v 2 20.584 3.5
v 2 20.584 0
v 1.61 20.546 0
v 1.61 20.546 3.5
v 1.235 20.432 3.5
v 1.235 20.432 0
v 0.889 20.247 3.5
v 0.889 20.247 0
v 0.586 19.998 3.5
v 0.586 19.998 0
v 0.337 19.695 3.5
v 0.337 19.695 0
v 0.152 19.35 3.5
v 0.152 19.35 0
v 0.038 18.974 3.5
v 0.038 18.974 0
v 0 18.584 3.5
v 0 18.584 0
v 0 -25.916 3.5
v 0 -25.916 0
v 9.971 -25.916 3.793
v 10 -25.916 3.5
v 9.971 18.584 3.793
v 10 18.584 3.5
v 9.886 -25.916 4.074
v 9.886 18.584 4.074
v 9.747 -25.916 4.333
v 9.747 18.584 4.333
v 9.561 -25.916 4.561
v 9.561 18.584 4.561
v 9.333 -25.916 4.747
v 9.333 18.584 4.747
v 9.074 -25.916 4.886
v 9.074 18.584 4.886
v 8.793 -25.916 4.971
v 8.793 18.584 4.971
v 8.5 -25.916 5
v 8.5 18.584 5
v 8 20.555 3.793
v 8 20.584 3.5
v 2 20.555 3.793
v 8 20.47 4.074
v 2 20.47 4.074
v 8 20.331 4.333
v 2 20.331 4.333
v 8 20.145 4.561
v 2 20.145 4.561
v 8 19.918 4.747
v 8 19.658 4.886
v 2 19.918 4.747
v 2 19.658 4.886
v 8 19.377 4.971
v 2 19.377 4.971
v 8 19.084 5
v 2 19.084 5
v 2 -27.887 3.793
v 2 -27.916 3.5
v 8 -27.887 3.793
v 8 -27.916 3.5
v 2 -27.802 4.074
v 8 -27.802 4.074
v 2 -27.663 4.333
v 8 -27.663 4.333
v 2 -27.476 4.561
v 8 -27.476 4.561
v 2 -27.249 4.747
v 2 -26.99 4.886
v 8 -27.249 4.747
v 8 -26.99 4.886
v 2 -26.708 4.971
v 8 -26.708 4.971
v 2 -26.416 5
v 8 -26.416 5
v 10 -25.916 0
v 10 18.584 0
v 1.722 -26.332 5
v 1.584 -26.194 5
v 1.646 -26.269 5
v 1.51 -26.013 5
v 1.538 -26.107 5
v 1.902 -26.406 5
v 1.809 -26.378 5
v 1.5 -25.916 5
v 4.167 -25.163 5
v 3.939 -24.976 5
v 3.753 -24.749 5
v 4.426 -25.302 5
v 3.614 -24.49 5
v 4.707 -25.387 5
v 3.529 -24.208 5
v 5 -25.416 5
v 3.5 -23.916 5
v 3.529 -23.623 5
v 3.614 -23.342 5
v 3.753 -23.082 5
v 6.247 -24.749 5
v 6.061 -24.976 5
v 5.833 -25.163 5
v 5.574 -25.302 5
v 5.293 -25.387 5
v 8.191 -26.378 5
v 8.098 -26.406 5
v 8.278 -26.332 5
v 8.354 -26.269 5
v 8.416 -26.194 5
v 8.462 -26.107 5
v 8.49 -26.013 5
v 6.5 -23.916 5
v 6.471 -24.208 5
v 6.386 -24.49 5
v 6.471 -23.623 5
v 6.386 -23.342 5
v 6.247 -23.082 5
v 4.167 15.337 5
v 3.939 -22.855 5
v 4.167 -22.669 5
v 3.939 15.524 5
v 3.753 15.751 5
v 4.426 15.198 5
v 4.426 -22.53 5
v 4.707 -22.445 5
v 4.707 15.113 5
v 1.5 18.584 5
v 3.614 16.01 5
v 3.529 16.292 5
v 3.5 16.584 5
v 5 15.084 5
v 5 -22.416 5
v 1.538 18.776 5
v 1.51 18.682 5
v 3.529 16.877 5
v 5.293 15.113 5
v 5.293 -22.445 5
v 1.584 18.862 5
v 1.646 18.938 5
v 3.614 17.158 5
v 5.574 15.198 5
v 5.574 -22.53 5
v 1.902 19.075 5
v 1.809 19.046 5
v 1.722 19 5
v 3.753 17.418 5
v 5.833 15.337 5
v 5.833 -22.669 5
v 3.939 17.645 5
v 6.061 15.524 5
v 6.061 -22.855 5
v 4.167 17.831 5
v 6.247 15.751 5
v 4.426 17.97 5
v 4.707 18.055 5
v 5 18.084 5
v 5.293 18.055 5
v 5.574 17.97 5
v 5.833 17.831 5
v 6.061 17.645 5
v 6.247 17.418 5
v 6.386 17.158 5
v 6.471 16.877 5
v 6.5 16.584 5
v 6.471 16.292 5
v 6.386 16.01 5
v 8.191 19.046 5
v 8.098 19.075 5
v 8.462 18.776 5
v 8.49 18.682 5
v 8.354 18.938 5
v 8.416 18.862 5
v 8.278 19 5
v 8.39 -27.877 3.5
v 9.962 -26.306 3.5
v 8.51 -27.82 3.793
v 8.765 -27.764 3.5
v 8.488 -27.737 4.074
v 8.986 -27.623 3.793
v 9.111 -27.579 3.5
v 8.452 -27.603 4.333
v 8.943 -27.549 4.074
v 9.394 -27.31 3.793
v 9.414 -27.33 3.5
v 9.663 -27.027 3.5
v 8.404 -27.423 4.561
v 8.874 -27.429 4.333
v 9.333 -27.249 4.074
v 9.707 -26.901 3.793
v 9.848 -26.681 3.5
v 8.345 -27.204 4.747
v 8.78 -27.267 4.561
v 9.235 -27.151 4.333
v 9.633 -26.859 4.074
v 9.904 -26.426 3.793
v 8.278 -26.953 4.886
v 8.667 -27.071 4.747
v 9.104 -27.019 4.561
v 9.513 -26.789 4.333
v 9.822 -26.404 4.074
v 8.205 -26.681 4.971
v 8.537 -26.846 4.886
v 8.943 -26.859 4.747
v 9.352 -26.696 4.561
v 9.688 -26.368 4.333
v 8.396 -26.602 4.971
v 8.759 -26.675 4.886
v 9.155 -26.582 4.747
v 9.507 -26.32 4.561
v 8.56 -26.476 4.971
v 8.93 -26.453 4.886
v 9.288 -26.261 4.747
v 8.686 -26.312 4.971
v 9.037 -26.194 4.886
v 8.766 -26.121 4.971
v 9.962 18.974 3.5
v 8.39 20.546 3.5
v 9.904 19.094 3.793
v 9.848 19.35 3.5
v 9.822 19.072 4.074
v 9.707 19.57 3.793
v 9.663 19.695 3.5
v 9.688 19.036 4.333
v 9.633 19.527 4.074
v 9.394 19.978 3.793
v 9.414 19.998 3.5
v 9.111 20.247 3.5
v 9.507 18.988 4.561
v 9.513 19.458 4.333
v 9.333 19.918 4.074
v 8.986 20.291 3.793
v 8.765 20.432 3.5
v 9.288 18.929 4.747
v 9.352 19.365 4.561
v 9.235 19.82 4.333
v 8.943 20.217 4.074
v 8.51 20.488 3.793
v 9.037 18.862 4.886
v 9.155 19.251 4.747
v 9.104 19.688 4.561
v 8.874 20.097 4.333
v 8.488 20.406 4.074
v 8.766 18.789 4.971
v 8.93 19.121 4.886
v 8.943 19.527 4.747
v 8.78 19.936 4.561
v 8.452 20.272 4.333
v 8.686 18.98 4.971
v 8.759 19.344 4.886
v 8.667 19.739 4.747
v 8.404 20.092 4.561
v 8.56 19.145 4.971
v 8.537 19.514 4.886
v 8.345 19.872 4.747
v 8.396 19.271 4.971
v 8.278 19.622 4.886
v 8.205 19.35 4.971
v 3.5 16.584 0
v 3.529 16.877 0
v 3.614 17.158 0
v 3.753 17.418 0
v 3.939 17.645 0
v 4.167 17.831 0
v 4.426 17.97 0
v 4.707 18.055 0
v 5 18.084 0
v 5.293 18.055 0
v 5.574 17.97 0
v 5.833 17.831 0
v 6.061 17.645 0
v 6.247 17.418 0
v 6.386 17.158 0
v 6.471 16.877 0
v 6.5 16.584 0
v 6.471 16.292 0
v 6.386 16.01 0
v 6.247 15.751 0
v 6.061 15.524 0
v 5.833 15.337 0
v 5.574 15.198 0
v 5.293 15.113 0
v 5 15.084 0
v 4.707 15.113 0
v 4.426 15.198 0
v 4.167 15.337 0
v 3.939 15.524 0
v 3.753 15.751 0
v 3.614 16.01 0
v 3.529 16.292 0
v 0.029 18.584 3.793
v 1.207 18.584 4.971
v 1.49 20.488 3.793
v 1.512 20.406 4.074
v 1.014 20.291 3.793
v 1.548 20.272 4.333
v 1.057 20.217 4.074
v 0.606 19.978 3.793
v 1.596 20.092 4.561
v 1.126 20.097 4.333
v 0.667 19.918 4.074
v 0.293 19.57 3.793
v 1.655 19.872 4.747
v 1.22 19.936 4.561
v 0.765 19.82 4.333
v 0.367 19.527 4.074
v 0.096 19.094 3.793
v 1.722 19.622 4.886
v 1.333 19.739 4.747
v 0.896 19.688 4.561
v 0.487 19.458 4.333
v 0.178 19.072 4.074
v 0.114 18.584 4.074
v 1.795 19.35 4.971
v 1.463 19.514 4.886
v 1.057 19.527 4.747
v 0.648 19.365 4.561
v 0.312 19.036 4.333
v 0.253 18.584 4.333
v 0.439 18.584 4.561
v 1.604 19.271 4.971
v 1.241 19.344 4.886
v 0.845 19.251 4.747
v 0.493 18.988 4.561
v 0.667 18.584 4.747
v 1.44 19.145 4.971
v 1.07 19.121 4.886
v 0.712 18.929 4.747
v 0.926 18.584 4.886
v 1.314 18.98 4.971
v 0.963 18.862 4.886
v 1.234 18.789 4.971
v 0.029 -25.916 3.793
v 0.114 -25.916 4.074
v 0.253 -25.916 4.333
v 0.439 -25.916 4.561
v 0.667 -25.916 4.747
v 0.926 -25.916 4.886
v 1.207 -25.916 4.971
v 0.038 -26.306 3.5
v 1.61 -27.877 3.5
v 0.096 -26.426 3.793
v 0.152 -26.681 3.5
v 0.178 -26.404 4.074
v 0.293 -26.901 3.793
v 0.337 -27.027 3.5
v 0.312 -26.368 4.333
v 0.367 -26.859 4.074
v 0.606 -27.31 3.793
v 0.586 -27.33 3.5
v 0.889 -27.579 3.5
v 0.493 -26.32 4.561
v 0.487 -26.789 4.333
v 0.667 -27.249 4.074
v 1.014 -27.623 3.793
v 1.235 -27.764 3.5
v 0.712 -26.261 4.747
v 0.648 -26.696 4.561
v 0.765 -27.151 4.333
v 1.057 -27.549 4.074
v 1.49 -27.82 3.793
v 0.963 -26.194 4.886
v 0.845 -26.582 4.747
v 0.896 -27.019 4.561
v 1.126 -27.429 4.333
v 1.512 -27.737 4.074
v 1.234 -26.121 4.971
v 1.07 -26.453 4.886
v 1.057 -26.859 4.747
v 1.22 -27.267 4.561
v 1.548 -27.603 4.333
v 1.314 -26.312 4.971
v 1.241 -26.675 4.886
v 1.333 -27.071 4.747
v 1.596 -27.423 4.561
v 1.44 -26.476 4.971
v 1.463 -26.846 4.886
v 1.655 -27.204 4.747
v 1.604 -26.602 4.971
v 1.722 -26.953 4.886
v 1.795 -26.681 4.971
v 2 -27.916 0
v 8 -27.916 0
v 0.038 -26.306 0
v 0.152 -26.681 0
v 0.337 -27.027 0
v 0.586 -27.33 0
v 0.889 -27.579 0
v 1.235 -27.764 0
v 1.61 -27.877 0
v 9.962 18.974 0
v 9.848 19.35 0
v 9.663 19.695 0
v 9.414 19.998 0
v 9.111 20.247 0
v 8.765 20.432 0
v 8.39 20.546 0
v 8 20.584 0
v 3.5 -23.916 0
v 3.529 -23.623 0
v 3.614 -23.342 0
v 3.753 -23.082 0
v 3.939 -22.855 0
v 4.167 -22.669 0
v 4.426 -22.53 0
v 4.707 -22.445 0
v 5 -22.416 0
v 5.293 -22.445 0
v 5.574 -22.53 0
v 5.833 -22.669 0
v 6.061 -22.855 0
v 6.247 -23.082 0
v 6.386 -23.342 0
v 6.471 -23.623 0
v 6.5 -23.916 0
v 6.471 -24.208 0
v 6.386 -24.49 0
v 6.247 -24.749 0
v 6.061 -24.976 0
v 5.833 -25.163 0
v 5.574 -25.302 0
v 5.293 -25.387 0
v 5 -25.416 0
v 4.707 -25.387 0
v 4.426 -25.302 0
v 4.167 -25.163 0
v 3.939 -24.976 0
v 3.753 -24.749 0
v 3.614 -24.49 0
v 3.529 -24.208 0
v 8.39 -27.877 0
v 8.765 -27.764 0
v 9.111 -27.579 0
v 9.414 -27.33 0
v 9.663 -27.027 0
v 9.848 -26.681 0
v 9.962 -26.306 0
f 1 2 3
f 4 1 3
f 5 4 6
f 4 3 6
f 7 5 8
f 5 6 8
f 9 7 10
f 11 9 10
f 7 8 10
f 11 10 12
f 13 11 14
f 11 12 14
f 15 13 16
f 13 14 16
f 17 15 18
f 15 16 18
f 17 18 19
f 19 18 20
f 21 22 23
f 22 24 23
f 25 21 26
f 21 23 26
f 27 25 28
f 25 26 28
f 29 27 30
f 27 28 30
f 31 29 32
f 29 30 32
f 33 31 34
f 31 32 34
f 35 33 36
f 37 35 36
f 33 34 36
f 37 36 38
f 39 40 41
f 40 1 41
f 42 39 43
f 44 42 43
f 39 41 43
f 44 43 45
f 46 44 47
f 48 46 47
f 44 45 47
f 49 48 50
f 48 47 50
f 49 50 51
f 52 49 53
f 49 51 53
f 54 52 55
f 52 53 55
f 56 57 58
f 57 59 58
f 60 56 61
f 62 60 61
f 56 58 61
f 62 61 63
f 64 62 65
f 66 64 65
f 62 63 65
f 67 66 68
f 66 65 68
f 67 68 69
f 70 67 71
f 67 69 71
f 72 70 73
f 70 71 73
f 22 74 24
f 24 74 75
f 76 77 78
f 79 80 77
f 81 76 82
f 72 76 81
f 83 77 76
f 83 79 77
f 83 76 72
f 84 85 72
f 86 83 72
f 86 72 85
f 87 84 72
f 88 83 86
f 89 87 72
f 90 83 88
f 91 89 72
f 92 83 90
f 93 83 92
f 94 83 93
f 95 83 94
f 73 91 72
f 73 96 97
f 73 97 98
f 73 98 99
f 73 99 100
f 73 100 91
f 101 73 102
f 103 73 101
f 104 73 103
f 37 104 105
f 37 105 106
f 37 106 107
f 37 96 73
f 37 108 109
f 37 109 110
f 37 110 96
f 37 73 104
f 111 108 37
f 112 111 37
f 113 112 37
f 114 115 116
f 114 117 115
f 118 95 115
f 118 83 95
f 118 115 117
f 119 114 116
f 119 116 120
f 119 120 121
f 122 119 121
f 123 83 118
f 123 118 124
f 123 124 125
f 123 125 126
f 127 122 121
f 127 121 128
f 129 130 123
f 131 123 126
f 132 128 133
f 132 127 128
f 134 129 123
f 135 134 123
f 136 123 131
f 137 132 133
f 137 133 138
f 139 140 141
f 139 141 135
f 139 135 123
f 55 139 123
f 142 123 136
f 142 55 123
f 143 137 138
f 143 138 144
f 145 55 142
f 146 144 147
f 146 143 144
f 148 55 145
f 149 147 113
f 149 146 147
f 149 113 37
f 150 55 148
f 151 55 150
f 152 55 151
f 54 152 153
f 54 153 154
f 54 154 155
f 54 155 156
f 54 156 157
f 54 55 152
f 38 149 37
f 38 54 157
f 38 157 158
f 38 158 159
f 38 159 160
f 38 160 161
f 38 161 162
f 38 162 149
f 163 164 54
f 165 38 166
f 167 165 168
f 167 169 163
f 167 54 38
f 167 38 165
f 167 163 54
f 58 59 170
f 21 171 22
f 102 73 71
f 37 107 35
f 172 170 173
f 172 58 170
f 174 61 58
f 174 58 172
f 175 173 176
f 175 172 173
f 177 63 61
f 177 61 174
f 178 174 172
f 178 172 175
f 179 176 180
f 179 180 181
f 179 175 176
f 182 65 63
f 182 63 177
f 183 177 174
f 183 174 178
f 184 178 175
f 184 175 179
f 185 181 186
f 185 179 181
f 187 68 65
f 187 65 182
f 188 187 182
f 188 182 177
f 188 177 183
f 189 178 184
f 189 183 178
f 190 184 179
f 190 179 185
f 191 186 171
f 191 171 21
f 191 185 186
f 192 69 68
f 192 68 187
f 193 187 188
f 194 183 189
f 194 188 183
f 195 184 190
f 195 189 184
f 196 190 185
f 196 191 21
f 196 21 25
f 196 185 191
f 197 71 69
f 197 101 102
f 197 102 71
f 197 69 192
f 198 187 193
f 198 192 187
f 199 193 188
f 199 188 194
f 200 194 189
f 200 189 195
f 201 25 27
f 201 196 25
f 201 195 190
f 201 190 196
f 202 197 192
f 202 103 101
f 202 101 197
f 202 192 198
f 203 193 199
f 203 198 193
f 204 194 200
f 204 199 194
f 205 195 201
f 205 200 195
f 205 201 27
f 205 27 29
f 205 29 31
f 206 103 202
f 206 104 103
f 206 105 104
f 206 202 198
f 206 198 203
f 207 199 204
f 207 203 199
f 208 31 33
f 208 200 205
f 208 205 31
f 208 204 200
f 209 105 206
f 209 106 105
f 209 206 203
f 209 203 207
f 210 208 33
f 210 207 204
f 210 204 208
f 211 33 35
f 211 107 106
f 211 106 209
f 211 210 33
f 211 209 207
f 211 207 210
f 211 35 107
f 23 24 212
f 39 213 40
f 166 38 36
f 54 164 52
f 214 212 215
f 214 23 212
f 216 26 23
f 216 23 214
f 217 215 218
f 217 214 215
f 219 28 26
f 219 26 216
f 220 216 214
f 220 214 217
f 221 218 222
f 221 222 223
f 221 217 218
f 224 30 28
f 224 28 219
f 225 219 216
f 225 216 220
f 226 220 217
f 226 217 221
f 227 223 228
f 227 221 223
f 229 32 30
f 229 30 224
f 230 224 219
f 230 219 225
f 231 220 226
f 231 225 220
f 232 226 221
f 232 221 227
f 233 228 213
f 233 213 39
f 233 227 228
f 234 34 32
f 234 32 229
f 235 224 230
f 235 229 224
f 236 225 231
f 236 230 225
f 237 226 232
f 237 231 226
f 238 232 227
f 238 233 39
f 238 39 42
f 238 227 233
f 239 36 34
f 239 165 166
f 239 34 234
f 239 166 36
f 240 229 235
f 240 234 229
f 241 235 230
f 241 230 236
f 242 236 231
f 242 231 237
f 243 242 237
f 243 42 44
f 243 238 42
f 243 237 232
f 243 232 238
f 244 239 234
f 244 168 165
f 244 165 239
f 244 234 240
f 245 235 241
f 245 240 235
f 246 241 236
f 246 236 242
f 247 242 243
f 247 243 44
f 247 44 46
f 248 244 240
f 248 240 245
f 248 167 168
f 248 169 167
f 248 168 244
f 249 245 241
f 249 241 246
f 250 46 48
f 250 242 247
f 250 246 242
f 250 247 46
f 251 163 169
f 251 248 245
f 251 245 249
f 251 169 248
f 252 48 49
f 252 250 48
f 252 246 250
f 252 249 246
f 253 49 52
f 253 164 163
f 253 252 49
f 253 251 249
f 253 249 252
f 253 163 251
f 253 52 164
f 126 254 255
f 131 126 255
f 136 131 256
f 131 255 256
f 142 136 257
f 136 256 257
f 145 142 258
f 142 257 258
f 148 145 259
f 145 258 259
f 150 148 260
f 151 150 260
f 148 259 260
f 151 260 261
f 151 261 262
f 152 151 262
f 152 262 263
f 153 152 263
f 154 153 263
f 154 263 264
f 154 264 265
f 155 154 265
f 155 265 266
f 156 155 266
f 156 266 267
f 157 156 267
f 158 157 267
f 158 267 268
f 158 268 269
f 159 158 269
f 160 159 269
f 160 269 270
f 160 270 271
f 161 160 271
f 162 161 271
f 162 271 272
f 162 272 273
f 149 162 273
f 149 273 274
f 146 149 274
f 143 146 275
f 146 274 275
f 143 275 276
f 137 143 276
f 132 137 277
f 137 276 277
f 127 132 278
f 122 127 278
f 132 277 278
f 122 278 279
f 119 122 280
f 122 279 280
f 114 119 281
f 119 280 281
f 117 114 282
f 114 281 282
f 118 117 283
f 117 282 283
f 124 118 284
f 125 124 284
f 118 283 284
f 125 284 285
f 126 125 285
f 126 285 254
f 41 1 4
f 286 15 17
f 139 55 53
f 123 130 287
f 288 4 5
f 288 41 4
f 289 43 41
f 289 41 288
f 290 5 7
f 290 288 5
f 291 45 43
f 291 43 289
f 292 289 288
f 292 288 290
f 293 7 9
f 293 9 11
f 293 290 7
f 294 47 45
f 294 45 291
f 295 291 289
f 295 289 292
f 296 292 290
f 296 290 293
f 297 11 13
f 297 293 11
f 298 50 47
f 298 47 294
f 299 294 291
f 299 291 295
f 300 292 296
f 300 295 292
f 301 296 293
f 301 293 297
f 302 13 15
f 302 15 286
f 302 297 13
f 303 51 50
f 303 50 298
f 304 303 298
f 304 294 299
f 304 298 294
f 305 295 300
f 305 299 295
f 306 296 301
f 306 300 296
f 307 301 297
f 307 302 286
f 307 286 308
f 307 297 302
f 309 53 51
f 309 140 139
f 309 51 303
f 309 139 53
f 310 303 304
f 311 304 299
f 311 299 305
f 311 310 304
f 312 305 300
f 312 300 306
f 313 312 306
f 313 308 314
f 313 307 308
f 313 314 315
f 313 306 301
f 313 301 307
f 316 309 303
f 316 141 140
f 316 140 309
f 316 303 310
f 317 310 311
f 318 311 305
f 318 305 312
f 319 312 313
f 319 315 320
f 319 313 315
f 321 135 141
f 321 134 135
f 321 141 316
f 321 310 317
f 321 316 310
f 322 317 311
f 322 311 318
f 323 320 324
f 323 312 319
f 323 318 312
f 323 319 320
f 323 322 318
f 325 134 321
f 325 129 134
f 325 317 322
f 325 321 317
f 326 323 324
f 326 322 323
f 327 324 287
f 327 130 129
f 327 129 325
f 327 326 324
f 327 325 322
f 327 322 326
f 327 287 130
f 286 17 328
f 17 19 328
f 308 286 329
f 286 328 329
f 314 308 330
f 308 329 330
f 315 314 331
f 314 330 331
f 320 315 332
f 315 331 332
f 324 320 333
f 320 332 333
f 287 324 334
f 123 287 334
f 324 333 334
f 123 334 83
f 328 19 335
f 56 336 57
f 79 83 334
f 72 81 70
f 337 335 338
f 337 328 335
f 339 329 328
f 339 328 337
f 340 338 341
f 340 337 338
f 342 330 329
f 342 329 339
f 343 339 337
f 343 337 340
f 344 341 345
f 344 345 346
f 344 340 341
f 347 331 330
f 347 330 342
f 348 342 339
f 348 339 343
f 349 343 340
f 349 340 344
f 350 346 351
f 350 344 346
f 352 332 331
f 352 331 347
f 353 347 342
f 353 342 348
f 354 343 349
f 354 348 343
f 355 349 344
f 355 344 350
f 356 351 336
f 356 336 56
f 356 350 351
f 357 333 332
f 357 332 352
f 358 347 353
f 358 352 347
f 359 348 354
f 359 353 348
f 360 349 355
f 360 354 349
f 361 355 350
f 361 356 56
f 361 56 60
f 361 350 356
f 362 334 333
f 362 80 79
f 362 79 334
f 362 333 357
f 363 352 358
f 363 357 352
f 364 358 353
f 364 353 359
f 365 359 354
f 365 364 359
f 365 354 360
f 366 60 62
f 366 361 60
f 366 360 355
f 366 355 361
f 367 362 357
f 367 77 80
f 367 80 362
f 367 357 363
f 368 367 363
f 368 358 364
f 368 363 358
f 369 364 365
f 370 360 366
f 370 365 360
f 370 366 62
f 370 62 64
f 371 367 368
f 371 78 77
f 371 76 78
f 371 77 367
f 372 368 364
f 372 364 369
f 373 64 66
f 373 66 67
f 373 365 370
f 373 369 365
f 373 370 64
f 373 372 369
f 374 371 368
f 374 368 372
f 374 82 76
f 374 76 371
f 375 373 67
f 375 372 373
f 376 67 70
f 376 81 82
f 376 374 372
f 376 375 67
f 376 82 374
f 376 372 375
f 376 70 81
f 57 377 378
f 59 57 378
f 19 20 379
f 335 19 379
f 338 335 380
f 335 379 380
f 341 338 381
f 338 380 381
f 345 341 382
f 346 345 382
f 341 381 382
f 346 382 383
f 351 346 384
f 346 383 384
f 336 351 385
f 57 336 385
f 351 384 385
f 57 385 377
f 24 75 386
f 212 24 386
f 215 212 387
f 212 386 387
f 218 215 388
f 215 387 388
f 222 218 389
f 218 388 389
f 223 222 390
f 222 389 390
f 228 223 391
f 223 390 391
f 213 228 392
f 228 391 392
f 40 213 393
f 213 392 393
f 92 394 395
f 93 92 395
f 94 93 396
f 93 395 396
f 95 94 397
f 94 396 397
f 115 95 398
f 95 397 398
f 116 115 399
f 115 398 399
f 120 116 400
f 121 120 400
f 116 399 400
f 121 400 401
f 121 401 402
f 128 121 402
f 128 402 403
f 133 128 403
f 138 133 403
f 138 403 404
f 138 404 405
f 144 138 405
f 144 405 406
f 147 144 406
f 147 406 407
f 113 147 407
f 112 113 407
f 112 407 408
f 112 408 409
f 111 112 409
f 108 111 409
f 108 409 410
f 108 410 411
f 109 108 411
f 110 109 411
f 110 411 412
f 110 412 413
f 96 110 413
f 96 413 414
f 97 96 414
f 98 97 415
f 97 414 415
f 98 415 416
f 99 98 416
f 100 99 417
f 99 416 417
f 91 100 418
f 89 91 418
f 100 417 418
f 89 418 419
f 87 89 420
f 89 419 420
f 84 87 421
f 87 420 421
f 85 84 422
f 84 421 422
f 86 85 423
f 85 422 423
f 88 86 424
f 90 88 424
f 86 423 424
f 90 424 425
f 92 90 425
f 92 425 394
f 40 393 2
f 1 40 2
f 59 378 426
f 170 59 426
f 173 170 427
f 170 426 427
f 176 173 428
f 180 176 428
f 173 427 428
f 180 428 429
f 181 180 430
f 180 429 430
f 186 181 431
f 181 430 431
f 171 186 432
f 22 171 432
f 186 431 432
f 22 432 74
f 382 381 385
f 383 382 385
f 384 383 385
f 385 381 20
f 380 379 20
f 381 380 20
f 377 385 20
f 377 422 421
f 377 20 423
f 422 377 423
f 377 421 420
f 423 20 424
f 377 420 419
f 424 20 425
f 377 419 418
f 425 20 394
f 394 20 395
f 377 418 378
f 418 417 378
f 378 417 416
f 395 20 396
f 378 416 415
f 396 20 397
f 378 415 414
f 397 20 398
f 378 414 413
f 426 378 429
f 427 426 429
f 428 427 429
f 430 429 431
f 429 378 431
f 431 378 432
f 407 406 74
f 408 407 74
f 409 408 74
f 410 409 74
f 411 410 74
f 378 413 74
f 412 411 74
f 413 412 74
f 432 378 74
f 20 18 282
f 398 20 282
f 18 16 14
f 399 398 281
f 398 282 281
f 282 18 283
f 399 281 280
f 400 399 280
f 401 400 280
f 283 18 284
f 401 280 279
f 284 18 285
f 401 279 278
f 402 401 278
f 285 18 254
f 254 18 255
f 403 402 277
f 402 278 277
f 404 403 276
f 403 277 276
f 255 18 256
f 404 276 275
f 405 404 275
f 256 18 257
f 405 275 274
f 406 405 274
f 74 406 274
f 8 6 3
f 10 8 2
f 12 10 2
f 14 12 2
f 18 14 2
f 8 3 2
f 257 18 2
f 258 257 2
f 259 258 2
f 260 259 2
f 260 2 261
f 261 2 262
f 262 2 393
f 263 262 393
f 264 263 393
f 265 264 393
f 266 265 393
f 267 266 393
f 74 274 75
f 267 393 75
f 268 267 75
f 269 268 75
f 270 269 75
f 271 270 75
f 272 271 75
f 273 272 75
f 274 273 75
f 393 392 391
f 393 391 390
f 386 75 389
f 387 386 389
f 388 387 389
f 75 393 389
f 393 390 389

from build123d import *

# Parameters (mm, degrees)
BOSS_EXTRUDE1_DEPTH = 5
SKETCH4_R           = 1.5
CUT_EXTRUDE1_DEPTH  = 6
FILLET1_R           = 1.5


with BuildPart() as part:
    # Sketch2 → Boss-Extrude1 (new body)
    with BuildSketch(Plane.XY):
        with BuildLine():
            Line((8, 20.584180911), (2, 20.584180911))
            ThreePointArc((2, 20.584180911), (0.585786438, 19.998394474), (0, 18.584180911))
            Line((0, 18.584180911), (0, -25.915819089))
            ThreePointArc((0, -25.915819089), (0.585786438, -27.330032651), (2, -27.915819089))
            Line((2, -27.915819089), (8, -27.915819089))
            ThreePointArc((8, -27.915819089), (9.414213562, -27.330032651), (10, -25.915819089))
            Line((10, -25.915819089), (10, 18.584180911))
            ThreePointArc((10, 18.584180911), (9.414213562, 19.998394474), (8, 20.584180911))
        make_face()
    extrude(amount=BOSS_EXTRUDE1_DEPTH)

    # Sketch4 → Cut-Extrude1 (cut, through all)
    with BuildSketch(Plane(origin=(0, 0, 0), x_dir=(-1, 0, 0), z_dir=(0, 0, -1))):
        with Locations((-5, -23.915819089)):
            Circle(SKETCH4_R)
        with Locations((-5, 16.584180911)):
            Circle(SKETCH4_R)
    extrude(amount=-CUT_EXTRUDE1_DEPTH, mode=Mode.SUBTRACT)

    # Fillet1
    fillet1_edges = [part.edges().sort_by_distance(p)[0] for p in [
        (0.585786438, 19.998394474, 5),
        (0, -3.665819089, 5),
        (0.585786438, -27.330032651, 5),
        (5, -27.915819089, 5),
        (9.414213562, -27.330032651, 5),
        (10, -3.665819089, 5),
        (9.414213562, 19.998394474, 5),
        (5, 20.584180911, 5),
    ]]
    fillet(fillet1_edges, radius=FILLET1_R)


solid = part.part
